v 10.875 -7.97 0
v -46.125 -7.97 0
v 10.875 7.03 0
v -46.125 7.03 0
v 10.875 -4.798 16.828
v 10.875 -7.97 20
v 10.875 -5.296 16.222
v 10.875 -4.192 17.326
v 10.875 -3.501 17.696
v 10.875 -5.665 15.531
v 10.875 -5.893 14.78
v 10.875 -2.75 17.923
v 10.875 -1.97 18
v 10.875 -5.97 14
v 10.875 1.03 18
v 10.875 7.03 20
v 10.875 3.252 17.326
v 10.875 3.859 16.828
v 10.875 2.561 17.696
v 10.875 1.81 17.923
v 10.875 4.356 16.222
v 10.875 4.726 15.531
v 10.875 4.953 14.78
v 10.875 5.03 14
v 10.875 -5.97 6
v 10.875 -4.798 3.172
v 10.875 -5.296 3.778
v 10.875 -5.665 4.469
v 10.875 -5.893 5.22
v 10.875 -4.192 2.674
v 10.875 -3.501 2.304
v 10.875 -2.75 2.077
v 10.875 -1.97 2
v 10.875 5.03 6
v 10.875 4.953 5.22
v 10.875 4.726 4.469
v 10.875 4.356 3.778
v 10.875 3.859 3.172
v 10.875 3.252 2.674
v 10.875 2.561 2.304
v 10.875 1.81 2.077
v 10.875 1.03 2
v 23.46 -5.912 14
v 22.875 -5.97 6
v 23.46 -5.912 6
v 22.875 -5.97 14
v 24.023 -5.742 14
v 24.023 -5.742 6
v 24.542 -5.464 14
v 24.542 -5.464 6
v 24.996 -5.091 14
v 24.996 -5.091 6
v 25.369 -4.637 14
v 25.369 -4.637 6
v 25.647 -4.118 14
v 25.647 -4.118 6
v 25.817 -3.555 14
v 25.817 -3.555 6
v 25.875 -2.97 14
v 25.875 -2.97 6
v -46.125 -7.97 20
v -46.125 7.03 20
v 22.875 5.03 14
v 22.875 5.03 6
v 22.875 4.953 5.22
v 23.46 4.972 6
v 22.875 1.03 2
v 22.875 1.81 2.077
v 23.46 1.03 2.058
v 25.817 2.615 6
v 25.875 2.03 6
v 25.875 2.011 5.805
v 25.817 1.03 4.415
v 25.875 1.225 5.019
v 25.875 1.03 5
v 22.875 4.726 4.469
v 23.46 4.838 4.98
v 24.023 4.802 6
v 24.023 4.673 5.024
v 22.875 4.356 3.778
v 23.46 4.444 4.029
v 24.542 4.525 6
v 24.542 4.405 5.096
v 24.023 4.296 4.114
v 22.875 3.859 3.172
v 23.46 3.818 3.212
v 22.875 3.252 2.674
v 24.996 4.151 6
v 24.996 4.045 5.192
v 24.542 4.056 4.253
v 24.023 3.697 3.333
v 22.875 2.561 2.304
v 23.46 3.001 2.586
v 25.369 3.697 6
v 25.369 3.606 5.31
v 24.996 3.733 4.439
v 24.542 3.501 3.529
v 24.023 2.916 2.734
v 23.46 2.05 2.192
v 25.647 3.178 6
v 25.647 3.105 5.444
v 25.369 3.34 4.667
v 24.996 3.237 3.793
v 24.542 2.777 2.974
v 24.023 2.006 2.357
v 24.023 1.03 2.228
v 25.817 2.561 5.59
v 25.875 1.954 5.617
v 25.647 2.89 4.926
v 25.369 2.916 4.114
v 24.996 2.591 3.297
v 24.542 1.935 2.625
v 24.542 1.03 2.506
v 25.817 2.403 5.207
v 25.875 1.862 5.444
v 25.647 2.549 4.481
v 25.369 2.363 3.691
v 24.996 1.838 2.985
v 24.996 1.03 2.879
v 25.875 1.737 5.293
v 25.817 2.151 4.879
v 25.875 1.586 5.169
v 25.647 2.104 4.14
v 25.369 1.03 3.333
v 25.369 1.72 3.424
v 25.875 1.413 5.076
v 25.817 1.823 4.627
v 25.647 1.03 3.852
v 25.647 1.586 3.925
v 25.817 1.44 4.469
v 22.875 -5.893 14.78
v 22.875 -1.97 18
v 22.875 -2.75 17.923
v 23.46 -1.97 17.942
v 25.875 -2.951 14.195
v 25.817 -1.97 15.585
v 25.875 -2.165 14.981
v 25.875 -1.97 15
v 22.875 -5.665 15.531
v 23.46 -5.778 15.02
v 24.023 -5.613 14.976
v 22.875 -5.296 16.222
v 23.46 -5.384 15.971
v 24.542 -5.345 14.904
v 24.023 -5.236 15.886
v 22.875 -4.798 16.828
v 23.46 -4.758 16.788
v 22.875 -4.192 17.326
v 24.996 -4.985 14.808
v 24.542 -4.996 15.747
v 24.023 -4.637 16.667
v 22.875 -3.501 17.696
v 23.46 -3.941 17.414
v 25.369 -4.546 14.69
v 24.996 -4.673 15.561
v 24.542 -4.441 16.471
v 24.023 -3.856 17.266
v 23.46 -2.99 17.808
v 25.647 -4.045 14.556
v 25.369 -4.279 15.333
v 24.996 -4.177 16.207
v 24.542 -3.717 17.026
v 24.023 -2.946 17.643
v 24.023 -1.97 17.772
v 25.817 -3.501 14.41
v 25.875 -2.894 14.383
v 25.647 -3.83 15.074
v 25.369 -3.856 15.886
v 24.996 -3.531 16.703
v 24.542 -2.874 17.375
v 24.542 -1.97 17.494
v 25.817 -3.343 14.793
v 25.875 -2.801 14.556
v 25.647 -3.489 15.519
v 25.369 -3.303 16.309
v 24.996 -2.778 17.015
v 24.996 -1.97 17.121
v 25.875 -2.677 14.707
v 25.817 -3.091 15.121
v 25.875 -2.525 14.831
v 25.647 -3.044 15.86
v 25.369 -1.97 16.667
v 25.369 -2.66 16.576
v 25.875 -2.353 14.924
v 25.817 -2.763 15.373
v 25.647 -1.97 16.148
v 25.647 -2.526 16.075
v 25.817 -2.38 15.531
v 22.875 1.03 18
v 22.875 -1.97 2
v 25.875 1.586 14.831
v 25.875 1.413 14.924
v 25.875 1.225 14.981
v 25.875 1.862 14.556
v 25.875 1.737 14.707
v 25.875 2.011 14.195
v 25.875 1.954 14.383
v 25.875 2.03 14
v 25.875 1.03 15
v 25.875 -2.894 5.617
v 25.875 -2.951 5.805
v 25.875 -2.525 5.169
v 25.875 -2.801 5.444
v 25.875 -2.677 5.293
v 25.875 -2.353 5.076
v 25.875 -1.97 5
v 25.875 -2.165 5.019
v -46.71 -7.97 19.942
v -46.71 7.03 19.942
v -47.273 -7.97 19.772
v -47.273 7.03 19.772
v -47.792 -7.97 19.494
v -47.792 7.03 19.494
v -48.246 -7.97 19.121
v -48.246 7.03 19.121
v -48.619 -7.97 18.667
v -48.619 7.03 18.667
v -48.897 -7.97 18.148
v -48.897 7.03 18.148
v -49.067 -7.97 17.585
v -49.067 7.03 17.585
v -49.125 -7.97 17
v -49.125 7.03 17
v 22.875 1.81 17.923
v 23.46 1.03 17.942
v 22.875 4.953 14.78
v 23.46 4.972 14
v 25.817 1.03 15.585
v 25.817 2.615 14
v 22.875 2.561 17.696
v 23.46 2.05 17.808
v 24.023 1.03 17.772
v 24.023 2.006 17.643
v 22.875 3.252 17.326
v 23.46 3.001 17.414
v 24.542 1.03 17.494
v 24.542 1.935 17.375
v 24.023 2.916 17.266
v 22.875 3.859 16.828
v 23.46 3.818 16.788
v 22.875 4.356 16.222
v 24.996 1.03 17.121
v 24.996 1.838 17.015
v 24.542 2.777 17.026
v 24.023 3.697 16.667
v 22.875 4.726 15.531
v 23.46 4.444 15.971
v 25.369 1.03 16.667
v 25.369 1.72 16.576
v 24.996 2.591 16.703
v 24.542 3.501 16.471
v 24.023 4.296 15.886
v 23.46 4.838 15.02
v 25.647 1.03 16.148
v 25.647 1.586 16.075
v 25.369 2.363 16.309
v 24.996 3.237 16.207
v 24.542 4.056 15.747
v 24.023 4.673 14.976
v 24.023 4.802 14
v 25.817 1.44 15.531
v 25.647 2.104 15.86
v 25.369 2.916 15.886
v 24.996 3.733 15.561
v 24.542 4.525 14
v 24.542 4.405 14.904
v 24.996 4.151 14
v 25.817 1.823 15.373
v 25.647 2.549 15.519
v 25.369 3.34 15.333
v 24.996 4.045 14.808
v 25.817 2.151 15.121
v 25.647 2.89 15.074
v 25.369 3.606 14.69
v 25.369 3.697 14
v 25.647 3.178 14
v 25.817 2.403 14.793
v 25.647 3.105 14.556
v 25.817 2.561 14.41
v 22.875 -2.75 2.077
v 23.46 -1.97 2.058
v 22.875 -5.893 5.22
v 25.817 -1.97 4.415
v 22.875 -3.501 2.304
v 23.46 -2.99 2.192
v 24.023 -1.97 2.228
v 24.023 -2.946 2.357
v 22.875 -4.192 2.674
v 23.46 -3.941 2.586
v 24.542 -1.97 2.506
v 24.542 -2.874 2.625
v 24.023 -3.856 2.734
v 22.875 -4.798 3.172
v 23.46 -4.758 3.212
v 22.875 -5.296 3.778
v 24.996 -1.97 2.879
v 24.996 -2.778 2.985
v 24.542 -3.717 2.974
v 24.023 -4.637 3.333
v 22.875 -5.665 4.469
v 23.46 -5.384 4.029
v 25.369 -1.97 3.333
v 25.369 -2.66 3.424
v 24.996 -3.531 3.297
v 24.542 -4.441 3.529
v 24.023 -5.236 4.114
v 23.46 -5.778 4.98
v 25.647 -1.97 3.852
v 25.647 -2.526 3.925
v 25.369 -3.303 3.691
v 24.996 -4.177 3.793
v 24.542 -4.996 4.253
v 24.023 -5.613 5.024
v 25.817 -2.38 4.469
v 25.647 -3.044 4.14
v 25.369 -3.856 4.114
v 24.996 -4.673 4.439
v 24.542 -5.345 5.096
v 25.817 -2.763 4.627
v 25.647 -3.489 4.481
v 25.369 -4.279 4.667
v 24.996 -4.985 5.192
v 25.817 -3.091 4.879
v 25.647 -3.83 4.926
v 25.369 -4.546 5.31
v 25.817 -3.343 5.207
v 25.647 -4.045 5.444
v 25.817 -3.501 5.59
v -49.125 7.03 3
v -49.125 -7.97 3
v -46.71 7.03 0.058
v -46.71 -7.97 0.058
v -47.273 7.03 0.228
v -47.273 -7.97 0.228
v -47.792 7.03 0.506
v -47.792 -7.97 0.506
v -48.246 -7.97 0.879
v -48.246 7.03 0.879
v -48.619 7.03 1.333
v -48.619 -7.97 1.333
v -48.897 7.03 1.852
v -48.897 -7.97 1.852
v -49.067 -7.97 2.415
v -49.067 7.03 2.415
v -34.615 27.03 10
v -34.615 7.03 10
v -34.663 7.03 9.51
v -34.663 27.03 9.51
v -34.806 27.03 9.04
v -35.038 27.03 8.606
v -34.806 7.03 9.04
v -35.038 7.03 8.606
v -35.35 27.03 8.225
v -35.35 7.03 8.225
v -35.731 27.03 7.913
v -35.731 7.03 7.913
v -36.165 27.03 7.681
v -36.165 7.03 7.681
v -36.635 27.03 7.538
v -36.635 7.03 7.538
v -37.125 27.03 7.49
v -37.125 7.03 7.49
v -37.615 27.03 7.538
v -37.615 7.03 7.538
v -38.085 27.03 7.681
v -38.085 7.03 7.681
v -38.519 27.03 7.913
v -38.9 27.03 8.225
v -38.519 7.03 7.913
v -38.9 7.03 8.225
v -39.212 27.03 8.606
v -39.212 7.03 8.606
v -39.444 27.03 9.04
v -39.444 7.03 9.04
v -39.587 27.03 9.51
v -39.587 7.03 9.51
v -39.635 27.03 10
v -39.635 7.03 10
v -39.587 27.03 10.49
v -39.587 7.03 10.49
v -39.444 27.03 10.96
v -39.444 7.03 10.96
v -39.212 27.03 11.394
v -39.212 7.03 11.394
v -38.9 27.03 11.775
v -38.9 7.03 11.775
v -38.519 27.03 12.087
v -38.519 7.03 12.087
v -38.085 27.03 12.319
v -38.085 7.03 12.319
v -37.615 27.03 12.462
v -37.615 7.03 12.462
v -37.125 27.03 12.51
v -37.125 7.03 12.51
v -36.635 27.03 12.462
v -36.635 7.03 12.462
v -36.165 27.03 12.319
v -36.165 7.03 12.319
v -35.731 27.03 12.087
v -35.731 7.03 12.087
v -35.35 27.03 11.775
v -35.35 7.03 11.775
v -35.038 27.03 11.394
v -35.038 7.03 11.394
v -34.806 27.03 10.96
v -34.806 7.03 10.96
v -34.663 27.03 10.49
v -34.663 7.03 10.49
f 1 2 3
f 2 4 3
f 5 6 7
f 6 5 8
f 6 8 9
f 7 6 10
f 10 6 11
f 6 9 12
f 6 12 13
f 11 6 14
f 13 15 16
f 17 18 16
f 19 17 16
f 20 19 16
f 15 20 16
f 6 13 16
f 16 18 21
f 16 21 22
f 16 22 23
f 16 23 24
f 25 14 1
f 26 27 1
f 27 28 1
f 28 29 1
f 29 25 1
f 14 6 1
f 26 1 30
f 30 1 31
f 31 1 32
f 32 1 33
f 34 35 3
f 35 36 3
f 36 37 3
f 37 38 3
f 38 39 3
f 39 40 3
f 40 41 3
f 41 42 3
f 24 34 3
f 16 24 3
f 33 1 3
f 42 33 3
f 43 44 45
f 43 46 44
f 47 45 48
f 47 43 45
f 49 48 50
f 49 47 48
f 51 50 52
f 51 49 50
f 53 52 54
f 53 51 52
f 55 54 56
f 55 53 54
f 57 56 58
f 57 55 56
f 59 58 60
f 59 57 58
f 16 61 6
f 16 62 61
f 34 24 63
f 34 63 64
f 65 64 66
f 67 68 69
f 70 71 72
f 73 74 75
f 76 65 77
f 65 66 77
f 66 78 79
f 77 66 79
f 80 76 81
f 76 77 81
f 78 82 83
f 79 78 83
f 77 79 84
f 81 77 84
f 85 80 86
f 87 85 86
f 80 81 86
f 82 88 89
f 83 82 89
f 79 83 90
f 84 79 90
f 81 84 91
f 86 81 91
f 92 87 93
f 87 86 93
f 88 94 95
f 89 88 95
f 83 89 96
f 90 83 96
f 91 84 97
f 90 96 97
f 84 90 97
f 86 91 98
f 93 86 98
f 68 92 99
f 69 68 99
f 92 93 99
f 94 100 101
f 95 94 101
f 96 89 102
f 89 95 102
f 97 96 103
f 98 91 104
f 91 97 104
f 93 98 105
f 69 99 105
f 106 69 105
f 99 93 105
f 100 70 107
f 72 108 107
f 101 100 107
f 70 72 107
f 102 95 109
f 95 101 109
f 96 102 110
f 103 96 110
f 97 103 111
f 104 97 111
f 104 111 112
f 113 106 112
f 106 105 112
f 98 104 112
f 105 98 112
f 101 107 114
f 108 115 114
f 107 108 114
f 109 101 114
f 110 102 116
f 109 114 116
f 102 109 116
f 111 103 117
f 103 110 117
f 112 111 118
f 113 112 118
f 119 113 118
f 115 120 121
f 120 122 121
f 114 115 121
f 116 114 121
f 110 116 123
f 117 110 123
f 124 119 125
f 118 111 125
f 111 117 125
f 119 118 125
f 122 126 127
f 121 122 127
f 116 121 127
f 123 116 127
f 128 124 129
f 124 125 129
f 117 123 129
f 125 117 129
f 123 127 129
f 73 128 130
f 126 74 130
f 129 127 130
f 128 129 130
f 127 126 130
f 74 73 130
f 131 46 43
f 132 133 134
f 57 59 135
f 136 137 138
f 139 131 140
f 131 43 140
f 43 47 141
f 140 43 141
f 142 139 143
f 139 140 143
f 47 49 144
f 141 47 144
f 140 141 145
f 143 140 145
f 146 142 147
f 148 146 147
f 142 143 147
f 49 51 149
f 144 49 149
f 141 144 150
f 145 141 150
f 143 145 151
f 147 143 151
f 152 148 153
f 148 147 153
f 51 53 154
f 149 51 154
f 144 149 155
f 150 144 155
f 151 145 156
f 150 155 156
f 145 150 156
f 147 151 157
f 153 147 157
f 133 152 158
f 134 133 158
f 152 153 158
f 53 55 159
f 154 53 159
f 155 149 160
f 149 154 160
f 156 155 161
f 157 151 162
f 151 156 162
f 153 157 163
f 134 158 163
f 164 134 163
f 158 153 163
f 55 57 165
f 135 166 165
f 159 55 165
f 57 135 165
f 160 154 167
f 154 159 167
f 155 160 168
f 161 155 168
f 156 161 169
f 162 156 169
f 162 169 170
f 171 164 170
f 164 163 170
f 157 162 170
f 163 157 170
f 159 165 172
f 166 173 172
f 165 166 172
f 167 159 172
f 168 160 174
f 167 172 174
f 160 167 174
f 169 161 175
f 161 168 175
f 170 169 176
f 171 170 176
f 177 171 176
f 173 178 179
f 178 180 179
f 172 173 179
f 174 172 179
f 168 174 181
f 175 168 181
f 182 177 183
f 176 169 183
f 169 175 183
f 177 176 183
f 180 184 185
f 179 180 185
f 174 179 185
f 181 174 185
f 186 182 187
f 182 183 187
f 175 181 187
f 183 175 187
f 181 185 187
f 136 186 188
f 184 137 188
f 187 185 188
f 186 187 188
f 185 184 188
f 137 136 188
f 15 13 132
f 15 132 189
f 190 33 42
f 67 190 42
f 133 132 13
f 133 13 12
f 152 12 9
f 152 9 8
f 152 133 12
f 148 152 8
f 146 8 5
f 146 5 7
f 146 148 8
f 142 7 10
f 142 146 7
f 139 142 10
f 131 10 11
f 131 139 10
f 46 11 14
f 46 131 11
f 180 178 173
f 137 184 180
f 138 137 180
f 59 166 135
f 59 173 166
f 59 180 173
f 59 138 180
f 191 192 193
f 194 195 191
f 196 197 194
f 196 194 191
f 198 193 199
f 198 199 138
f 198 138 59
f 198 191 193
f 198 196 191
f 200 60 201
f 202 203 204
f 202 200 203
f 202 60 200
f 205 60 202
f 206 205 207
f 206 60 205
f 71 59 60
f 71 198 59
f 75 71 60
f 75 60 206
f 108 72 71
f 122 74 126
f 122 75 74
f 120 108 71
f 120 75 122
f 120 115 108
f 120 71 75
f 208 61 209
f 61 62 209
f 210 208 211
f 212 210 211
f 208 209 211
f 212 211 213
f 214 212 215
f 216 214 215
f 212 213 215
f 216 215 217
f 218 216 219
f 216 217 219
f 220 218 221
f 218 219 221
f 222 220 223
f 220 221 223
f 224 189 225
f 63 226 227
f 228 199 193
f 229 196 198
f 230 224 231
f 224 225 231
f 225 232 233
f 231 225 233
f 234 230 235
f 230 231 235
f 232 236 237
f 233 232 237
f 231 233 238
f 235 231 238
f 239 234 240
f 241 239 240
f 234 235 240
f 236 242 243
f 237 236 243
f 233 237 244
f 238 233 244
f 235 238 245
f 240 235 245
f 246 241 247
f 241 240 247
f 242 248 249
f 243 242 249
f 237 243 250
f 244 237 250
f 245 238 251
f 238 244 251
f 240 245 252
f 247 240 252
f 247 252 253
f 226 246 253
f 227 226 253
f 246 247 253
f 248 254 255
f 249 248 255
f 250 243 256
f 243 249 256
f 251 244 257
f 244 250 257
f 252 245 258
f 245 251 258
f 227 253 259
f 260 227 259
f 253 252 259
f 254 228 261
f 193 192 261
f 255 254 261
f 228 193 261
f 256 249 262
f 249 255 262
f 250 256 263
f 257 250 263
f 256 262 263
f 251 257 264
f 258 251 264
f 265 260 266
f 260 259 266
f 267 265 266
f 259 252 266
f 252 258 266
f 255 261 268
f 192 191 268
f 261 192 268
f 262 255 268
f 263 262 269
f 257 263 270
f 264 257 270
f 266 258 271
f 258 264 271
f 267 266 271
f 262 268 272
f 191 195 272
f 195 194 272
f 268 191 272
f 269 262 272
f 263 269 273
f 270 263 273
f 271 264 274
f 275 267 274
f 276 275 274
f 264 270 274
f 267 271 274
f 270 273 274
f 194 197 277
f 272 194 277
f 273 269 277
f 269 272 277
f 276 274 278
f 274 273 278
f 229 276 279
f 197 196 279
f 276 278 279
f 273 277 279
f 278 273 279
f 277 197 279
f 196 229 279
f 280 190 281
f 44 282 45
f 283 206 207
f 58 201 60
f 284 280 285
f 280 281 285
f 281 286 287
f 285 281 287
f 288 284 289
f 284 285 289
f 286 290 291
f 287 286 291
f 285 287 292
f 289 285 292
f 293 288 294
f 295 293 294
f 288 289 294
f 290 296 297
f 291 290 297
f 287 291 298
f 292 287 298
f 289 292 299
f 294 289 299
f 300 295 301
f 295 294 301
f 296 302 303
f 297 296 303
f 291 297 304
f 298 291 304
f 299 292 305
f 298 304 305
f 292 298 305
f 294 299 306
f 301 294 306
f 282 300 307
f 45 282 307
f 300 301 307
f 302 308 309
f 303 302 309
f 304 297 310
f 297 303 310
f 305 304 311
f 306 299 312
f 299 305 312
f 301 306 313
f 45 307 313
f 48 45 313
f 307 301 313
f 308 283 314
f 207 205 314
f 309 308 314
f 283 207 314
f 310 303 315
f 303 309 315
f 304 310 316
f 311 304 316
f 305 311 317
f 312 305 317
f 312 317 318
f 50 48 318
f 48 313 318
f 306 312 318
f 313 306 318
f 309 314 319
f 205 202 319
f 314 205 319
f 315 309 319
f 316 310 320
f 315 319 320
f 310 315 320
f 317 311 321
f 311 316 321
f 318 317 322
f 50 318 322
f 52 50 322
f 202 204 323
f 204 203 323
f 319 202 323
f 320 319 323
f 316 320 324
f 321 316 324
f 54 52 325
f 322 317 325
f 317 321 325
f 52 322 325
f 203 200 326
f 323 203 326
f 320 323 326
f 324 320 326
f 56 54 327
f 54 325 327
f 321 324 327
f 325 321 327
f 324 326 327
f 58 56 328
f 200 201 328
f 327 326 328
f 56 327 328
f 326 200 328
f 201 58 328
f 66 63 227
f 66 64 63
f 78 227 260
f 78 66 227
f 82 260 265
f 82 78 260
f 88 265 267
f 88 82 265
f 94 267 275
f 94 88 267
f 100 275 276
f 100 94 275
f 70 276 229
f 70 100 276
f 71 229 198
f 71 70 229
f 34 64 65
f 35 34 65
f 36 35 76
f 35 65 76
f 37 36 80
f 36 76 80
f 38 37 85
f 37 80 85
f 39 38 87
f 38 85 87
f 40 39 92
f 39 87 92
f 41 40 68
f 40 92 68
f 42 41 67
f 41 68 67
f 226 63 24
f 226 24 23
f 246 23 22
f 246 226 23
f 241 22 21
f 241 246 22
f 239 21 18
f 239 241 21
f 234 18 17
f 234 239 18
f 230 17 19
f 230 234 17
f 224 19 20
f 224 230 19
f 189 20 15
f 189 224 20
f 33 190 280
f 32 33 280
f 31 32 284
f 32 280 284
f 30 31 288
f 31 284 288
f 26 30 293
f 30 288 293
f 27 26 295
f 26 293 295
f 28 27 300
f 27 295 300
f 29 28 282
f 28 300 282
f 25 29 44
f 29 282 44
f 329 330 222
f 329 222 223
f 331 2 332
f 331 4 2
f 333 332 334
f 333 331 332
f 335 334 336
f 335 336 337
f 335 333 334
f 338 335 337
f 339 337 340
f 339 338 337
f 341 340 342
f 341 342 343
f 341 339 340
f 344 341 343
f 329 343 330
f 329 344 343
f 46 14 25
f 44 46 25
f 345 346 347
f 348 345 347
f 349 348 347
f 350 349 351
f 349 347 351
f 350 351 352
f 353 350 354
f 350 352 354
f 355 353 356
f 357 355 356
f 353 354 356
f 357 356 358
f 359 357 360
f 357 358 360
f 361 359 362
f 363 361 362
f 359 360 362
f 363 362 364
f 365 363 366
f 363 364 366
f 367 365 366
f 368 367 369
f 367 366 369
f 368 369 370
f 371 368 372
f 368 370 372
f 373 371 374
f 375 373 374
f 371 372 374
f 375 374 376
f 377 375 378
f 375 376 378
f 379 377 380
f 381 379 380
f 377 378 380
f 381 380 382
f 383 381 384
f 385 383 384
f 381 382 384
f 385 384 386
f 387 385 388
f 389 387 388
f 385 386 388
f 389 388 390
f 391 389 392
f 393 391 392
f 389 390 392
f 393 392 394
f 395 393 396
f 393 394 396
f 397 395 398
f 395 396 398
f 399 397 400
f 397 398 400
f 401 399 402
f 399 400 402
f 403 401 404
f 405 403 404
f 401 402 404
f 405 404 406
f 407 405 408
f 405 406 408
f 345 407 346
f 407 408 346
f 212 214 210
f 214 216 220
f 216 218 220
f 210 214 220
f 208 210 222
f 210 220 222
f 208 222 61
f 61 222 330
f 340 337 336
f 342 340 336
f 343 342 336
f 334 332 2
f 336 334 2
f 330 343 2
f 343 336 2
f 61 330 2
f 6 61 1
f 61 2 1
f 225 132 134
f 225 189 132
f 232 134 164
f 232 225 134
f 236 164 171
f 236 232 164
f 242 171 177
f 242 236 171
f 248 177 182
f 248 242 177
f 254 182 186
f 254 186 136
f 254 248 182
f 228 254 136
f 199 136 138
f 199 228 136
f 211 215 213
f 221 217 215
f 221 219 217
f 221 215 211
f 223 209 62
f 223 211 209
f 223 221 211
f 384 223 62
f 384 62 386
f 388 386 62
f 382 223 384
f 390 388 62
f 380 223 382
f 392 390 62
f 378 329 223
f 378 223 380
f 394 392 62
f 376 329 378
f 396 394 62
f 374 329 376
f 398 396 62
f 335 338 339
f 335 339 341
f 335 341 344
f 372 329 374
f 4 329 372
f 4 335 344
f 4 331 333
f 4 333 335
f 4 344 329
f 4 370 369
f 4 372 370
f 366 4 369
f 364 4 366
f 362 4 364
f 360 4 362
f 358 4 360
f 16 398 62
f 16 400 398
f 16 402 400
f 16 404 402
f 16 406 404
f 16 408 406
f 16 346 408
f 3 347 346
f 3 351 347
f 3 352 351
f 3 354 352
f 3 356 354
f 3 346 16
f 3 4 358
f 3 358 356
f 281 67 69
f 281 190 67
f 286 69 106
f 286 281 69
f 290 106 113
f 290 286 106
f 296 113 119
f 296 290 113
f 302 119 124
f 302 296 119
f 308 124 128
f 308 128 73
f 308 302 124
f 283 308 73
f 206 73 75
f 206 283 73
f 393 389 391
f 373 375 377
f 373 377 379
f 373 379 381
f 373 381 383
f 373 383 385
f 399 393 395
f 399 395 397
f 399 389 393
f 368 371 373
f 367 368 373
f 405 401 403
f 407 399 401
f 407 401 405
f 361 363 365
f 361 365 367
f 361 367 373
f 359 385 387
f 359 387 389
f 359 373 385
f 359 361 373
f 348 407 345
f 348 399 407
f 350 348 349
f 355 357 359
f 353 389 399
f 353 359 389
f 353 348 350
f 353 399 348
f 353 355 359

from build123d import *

# Parameters (mm, degrees)
SKETCH1_W           = 60
SKETCH1_H           = 15
BOSS_EXTRUDE2_DEPTH = 20
SKETCH4_R           = 2.509766753
BOSS_EXTRUDE3_DEPTH = 20
SKETCH5_W           = 16
SKETCH5_H           = 11
BOSS_EXTRUDE4_DEPTH = 15
FILLET2_R           = 4
FILLET3_R           = 4
FILLET6_R           = 4
FILLET7_R           = 3
FILLET8_R           = 3


with BuildPart() as part:
    # Sketch1 → Boss-Extrude2 (new body)
    with BuildSketch(Plane.XY):
        with Locations((-19.125, -0.469901236)):
            Rectangle(SKETCH1_W, SKETCH1_H)
    extrude(amount=BOSS_EXTRUDE2_DEPTH)

    # Sketch4 → Boss-Extrude3 (add)
    with BuildSketch(Plane(origin=(0, 7.030098764, 0), x_dir=(1, 0, 0), z_dir=(0, 1, 0))):
        with Locations((-37.125, -10)):
            Circle(SKETCH4_R)
    extrude(amount=BOSS_EXTRUDE3_DEPTH)

    # Sketch5 → Boss-Extrude4 (add)
    with BuildSketch(Plane(origin=(10.875, 0, 0), x_dir=(0, 0, -1), z_dir=(1, 0, 0))):
        with Locations((-10, -0.469901236)):
            Rectangle(SKETCH5_W, SKETCH5_H)
    extrude(amount=BOSS_EXTRUDE4_DEPTH)

    # Fillet2
    fillet2_edges = [part.edges().sort_by_distance(p)[0] for p in [
        (18.375, 5.030098764, 2),
    ]]
    fillet(fillet2_edges, radius=FILLET2_R)

    # Fillet3
    fillet3_edges = [part.edges().sort_by_distance(p)[0] for p in [
        (18.375, 5.030098764, 18),
    ]]
    fillet(fillet3_edges, radius=FILLET3_R)

    # Fillet6
    fillet6_edges = [part.edges().sort_by_distance(p)[0] for p in [
        (18.375, -5.969901236, 2),
        (18.375, -5.969901236, 18),
    ]]
    fillet(fillet6_edges, radius=FILLET6_R)

    # Fillet7
    fillet7_edges = [part.edges().sort_by_distance(p)[0] for p in [
        (25.875, 5.030098764, 10),
        (25.875, 3.858525889, 3.171572875),
        (25.875, -0.469901236, 18),
        (25.875, 3.858525889, 16.828427125),
        (25.875, -5.969901236, 10),
        (25.875, -0.469901236, 2),
        (25.875, -4.798328361, 3.171572875),
        (25.875, -4.798328361, 16.828427125),
    ]]
    fillet(fillet7_edges, radius=FILLET7_R)

    # Fillet8
    fillet8_edges = [part.edges().sort_by_distance(p)[0] for p in [
        (-49.125, -0.469901236, 20),
        (-49.125, -0.469901236, 0),
    ]]
    fillet(fillet8_edges, radius=FILLET8_R)


solid = part.part
